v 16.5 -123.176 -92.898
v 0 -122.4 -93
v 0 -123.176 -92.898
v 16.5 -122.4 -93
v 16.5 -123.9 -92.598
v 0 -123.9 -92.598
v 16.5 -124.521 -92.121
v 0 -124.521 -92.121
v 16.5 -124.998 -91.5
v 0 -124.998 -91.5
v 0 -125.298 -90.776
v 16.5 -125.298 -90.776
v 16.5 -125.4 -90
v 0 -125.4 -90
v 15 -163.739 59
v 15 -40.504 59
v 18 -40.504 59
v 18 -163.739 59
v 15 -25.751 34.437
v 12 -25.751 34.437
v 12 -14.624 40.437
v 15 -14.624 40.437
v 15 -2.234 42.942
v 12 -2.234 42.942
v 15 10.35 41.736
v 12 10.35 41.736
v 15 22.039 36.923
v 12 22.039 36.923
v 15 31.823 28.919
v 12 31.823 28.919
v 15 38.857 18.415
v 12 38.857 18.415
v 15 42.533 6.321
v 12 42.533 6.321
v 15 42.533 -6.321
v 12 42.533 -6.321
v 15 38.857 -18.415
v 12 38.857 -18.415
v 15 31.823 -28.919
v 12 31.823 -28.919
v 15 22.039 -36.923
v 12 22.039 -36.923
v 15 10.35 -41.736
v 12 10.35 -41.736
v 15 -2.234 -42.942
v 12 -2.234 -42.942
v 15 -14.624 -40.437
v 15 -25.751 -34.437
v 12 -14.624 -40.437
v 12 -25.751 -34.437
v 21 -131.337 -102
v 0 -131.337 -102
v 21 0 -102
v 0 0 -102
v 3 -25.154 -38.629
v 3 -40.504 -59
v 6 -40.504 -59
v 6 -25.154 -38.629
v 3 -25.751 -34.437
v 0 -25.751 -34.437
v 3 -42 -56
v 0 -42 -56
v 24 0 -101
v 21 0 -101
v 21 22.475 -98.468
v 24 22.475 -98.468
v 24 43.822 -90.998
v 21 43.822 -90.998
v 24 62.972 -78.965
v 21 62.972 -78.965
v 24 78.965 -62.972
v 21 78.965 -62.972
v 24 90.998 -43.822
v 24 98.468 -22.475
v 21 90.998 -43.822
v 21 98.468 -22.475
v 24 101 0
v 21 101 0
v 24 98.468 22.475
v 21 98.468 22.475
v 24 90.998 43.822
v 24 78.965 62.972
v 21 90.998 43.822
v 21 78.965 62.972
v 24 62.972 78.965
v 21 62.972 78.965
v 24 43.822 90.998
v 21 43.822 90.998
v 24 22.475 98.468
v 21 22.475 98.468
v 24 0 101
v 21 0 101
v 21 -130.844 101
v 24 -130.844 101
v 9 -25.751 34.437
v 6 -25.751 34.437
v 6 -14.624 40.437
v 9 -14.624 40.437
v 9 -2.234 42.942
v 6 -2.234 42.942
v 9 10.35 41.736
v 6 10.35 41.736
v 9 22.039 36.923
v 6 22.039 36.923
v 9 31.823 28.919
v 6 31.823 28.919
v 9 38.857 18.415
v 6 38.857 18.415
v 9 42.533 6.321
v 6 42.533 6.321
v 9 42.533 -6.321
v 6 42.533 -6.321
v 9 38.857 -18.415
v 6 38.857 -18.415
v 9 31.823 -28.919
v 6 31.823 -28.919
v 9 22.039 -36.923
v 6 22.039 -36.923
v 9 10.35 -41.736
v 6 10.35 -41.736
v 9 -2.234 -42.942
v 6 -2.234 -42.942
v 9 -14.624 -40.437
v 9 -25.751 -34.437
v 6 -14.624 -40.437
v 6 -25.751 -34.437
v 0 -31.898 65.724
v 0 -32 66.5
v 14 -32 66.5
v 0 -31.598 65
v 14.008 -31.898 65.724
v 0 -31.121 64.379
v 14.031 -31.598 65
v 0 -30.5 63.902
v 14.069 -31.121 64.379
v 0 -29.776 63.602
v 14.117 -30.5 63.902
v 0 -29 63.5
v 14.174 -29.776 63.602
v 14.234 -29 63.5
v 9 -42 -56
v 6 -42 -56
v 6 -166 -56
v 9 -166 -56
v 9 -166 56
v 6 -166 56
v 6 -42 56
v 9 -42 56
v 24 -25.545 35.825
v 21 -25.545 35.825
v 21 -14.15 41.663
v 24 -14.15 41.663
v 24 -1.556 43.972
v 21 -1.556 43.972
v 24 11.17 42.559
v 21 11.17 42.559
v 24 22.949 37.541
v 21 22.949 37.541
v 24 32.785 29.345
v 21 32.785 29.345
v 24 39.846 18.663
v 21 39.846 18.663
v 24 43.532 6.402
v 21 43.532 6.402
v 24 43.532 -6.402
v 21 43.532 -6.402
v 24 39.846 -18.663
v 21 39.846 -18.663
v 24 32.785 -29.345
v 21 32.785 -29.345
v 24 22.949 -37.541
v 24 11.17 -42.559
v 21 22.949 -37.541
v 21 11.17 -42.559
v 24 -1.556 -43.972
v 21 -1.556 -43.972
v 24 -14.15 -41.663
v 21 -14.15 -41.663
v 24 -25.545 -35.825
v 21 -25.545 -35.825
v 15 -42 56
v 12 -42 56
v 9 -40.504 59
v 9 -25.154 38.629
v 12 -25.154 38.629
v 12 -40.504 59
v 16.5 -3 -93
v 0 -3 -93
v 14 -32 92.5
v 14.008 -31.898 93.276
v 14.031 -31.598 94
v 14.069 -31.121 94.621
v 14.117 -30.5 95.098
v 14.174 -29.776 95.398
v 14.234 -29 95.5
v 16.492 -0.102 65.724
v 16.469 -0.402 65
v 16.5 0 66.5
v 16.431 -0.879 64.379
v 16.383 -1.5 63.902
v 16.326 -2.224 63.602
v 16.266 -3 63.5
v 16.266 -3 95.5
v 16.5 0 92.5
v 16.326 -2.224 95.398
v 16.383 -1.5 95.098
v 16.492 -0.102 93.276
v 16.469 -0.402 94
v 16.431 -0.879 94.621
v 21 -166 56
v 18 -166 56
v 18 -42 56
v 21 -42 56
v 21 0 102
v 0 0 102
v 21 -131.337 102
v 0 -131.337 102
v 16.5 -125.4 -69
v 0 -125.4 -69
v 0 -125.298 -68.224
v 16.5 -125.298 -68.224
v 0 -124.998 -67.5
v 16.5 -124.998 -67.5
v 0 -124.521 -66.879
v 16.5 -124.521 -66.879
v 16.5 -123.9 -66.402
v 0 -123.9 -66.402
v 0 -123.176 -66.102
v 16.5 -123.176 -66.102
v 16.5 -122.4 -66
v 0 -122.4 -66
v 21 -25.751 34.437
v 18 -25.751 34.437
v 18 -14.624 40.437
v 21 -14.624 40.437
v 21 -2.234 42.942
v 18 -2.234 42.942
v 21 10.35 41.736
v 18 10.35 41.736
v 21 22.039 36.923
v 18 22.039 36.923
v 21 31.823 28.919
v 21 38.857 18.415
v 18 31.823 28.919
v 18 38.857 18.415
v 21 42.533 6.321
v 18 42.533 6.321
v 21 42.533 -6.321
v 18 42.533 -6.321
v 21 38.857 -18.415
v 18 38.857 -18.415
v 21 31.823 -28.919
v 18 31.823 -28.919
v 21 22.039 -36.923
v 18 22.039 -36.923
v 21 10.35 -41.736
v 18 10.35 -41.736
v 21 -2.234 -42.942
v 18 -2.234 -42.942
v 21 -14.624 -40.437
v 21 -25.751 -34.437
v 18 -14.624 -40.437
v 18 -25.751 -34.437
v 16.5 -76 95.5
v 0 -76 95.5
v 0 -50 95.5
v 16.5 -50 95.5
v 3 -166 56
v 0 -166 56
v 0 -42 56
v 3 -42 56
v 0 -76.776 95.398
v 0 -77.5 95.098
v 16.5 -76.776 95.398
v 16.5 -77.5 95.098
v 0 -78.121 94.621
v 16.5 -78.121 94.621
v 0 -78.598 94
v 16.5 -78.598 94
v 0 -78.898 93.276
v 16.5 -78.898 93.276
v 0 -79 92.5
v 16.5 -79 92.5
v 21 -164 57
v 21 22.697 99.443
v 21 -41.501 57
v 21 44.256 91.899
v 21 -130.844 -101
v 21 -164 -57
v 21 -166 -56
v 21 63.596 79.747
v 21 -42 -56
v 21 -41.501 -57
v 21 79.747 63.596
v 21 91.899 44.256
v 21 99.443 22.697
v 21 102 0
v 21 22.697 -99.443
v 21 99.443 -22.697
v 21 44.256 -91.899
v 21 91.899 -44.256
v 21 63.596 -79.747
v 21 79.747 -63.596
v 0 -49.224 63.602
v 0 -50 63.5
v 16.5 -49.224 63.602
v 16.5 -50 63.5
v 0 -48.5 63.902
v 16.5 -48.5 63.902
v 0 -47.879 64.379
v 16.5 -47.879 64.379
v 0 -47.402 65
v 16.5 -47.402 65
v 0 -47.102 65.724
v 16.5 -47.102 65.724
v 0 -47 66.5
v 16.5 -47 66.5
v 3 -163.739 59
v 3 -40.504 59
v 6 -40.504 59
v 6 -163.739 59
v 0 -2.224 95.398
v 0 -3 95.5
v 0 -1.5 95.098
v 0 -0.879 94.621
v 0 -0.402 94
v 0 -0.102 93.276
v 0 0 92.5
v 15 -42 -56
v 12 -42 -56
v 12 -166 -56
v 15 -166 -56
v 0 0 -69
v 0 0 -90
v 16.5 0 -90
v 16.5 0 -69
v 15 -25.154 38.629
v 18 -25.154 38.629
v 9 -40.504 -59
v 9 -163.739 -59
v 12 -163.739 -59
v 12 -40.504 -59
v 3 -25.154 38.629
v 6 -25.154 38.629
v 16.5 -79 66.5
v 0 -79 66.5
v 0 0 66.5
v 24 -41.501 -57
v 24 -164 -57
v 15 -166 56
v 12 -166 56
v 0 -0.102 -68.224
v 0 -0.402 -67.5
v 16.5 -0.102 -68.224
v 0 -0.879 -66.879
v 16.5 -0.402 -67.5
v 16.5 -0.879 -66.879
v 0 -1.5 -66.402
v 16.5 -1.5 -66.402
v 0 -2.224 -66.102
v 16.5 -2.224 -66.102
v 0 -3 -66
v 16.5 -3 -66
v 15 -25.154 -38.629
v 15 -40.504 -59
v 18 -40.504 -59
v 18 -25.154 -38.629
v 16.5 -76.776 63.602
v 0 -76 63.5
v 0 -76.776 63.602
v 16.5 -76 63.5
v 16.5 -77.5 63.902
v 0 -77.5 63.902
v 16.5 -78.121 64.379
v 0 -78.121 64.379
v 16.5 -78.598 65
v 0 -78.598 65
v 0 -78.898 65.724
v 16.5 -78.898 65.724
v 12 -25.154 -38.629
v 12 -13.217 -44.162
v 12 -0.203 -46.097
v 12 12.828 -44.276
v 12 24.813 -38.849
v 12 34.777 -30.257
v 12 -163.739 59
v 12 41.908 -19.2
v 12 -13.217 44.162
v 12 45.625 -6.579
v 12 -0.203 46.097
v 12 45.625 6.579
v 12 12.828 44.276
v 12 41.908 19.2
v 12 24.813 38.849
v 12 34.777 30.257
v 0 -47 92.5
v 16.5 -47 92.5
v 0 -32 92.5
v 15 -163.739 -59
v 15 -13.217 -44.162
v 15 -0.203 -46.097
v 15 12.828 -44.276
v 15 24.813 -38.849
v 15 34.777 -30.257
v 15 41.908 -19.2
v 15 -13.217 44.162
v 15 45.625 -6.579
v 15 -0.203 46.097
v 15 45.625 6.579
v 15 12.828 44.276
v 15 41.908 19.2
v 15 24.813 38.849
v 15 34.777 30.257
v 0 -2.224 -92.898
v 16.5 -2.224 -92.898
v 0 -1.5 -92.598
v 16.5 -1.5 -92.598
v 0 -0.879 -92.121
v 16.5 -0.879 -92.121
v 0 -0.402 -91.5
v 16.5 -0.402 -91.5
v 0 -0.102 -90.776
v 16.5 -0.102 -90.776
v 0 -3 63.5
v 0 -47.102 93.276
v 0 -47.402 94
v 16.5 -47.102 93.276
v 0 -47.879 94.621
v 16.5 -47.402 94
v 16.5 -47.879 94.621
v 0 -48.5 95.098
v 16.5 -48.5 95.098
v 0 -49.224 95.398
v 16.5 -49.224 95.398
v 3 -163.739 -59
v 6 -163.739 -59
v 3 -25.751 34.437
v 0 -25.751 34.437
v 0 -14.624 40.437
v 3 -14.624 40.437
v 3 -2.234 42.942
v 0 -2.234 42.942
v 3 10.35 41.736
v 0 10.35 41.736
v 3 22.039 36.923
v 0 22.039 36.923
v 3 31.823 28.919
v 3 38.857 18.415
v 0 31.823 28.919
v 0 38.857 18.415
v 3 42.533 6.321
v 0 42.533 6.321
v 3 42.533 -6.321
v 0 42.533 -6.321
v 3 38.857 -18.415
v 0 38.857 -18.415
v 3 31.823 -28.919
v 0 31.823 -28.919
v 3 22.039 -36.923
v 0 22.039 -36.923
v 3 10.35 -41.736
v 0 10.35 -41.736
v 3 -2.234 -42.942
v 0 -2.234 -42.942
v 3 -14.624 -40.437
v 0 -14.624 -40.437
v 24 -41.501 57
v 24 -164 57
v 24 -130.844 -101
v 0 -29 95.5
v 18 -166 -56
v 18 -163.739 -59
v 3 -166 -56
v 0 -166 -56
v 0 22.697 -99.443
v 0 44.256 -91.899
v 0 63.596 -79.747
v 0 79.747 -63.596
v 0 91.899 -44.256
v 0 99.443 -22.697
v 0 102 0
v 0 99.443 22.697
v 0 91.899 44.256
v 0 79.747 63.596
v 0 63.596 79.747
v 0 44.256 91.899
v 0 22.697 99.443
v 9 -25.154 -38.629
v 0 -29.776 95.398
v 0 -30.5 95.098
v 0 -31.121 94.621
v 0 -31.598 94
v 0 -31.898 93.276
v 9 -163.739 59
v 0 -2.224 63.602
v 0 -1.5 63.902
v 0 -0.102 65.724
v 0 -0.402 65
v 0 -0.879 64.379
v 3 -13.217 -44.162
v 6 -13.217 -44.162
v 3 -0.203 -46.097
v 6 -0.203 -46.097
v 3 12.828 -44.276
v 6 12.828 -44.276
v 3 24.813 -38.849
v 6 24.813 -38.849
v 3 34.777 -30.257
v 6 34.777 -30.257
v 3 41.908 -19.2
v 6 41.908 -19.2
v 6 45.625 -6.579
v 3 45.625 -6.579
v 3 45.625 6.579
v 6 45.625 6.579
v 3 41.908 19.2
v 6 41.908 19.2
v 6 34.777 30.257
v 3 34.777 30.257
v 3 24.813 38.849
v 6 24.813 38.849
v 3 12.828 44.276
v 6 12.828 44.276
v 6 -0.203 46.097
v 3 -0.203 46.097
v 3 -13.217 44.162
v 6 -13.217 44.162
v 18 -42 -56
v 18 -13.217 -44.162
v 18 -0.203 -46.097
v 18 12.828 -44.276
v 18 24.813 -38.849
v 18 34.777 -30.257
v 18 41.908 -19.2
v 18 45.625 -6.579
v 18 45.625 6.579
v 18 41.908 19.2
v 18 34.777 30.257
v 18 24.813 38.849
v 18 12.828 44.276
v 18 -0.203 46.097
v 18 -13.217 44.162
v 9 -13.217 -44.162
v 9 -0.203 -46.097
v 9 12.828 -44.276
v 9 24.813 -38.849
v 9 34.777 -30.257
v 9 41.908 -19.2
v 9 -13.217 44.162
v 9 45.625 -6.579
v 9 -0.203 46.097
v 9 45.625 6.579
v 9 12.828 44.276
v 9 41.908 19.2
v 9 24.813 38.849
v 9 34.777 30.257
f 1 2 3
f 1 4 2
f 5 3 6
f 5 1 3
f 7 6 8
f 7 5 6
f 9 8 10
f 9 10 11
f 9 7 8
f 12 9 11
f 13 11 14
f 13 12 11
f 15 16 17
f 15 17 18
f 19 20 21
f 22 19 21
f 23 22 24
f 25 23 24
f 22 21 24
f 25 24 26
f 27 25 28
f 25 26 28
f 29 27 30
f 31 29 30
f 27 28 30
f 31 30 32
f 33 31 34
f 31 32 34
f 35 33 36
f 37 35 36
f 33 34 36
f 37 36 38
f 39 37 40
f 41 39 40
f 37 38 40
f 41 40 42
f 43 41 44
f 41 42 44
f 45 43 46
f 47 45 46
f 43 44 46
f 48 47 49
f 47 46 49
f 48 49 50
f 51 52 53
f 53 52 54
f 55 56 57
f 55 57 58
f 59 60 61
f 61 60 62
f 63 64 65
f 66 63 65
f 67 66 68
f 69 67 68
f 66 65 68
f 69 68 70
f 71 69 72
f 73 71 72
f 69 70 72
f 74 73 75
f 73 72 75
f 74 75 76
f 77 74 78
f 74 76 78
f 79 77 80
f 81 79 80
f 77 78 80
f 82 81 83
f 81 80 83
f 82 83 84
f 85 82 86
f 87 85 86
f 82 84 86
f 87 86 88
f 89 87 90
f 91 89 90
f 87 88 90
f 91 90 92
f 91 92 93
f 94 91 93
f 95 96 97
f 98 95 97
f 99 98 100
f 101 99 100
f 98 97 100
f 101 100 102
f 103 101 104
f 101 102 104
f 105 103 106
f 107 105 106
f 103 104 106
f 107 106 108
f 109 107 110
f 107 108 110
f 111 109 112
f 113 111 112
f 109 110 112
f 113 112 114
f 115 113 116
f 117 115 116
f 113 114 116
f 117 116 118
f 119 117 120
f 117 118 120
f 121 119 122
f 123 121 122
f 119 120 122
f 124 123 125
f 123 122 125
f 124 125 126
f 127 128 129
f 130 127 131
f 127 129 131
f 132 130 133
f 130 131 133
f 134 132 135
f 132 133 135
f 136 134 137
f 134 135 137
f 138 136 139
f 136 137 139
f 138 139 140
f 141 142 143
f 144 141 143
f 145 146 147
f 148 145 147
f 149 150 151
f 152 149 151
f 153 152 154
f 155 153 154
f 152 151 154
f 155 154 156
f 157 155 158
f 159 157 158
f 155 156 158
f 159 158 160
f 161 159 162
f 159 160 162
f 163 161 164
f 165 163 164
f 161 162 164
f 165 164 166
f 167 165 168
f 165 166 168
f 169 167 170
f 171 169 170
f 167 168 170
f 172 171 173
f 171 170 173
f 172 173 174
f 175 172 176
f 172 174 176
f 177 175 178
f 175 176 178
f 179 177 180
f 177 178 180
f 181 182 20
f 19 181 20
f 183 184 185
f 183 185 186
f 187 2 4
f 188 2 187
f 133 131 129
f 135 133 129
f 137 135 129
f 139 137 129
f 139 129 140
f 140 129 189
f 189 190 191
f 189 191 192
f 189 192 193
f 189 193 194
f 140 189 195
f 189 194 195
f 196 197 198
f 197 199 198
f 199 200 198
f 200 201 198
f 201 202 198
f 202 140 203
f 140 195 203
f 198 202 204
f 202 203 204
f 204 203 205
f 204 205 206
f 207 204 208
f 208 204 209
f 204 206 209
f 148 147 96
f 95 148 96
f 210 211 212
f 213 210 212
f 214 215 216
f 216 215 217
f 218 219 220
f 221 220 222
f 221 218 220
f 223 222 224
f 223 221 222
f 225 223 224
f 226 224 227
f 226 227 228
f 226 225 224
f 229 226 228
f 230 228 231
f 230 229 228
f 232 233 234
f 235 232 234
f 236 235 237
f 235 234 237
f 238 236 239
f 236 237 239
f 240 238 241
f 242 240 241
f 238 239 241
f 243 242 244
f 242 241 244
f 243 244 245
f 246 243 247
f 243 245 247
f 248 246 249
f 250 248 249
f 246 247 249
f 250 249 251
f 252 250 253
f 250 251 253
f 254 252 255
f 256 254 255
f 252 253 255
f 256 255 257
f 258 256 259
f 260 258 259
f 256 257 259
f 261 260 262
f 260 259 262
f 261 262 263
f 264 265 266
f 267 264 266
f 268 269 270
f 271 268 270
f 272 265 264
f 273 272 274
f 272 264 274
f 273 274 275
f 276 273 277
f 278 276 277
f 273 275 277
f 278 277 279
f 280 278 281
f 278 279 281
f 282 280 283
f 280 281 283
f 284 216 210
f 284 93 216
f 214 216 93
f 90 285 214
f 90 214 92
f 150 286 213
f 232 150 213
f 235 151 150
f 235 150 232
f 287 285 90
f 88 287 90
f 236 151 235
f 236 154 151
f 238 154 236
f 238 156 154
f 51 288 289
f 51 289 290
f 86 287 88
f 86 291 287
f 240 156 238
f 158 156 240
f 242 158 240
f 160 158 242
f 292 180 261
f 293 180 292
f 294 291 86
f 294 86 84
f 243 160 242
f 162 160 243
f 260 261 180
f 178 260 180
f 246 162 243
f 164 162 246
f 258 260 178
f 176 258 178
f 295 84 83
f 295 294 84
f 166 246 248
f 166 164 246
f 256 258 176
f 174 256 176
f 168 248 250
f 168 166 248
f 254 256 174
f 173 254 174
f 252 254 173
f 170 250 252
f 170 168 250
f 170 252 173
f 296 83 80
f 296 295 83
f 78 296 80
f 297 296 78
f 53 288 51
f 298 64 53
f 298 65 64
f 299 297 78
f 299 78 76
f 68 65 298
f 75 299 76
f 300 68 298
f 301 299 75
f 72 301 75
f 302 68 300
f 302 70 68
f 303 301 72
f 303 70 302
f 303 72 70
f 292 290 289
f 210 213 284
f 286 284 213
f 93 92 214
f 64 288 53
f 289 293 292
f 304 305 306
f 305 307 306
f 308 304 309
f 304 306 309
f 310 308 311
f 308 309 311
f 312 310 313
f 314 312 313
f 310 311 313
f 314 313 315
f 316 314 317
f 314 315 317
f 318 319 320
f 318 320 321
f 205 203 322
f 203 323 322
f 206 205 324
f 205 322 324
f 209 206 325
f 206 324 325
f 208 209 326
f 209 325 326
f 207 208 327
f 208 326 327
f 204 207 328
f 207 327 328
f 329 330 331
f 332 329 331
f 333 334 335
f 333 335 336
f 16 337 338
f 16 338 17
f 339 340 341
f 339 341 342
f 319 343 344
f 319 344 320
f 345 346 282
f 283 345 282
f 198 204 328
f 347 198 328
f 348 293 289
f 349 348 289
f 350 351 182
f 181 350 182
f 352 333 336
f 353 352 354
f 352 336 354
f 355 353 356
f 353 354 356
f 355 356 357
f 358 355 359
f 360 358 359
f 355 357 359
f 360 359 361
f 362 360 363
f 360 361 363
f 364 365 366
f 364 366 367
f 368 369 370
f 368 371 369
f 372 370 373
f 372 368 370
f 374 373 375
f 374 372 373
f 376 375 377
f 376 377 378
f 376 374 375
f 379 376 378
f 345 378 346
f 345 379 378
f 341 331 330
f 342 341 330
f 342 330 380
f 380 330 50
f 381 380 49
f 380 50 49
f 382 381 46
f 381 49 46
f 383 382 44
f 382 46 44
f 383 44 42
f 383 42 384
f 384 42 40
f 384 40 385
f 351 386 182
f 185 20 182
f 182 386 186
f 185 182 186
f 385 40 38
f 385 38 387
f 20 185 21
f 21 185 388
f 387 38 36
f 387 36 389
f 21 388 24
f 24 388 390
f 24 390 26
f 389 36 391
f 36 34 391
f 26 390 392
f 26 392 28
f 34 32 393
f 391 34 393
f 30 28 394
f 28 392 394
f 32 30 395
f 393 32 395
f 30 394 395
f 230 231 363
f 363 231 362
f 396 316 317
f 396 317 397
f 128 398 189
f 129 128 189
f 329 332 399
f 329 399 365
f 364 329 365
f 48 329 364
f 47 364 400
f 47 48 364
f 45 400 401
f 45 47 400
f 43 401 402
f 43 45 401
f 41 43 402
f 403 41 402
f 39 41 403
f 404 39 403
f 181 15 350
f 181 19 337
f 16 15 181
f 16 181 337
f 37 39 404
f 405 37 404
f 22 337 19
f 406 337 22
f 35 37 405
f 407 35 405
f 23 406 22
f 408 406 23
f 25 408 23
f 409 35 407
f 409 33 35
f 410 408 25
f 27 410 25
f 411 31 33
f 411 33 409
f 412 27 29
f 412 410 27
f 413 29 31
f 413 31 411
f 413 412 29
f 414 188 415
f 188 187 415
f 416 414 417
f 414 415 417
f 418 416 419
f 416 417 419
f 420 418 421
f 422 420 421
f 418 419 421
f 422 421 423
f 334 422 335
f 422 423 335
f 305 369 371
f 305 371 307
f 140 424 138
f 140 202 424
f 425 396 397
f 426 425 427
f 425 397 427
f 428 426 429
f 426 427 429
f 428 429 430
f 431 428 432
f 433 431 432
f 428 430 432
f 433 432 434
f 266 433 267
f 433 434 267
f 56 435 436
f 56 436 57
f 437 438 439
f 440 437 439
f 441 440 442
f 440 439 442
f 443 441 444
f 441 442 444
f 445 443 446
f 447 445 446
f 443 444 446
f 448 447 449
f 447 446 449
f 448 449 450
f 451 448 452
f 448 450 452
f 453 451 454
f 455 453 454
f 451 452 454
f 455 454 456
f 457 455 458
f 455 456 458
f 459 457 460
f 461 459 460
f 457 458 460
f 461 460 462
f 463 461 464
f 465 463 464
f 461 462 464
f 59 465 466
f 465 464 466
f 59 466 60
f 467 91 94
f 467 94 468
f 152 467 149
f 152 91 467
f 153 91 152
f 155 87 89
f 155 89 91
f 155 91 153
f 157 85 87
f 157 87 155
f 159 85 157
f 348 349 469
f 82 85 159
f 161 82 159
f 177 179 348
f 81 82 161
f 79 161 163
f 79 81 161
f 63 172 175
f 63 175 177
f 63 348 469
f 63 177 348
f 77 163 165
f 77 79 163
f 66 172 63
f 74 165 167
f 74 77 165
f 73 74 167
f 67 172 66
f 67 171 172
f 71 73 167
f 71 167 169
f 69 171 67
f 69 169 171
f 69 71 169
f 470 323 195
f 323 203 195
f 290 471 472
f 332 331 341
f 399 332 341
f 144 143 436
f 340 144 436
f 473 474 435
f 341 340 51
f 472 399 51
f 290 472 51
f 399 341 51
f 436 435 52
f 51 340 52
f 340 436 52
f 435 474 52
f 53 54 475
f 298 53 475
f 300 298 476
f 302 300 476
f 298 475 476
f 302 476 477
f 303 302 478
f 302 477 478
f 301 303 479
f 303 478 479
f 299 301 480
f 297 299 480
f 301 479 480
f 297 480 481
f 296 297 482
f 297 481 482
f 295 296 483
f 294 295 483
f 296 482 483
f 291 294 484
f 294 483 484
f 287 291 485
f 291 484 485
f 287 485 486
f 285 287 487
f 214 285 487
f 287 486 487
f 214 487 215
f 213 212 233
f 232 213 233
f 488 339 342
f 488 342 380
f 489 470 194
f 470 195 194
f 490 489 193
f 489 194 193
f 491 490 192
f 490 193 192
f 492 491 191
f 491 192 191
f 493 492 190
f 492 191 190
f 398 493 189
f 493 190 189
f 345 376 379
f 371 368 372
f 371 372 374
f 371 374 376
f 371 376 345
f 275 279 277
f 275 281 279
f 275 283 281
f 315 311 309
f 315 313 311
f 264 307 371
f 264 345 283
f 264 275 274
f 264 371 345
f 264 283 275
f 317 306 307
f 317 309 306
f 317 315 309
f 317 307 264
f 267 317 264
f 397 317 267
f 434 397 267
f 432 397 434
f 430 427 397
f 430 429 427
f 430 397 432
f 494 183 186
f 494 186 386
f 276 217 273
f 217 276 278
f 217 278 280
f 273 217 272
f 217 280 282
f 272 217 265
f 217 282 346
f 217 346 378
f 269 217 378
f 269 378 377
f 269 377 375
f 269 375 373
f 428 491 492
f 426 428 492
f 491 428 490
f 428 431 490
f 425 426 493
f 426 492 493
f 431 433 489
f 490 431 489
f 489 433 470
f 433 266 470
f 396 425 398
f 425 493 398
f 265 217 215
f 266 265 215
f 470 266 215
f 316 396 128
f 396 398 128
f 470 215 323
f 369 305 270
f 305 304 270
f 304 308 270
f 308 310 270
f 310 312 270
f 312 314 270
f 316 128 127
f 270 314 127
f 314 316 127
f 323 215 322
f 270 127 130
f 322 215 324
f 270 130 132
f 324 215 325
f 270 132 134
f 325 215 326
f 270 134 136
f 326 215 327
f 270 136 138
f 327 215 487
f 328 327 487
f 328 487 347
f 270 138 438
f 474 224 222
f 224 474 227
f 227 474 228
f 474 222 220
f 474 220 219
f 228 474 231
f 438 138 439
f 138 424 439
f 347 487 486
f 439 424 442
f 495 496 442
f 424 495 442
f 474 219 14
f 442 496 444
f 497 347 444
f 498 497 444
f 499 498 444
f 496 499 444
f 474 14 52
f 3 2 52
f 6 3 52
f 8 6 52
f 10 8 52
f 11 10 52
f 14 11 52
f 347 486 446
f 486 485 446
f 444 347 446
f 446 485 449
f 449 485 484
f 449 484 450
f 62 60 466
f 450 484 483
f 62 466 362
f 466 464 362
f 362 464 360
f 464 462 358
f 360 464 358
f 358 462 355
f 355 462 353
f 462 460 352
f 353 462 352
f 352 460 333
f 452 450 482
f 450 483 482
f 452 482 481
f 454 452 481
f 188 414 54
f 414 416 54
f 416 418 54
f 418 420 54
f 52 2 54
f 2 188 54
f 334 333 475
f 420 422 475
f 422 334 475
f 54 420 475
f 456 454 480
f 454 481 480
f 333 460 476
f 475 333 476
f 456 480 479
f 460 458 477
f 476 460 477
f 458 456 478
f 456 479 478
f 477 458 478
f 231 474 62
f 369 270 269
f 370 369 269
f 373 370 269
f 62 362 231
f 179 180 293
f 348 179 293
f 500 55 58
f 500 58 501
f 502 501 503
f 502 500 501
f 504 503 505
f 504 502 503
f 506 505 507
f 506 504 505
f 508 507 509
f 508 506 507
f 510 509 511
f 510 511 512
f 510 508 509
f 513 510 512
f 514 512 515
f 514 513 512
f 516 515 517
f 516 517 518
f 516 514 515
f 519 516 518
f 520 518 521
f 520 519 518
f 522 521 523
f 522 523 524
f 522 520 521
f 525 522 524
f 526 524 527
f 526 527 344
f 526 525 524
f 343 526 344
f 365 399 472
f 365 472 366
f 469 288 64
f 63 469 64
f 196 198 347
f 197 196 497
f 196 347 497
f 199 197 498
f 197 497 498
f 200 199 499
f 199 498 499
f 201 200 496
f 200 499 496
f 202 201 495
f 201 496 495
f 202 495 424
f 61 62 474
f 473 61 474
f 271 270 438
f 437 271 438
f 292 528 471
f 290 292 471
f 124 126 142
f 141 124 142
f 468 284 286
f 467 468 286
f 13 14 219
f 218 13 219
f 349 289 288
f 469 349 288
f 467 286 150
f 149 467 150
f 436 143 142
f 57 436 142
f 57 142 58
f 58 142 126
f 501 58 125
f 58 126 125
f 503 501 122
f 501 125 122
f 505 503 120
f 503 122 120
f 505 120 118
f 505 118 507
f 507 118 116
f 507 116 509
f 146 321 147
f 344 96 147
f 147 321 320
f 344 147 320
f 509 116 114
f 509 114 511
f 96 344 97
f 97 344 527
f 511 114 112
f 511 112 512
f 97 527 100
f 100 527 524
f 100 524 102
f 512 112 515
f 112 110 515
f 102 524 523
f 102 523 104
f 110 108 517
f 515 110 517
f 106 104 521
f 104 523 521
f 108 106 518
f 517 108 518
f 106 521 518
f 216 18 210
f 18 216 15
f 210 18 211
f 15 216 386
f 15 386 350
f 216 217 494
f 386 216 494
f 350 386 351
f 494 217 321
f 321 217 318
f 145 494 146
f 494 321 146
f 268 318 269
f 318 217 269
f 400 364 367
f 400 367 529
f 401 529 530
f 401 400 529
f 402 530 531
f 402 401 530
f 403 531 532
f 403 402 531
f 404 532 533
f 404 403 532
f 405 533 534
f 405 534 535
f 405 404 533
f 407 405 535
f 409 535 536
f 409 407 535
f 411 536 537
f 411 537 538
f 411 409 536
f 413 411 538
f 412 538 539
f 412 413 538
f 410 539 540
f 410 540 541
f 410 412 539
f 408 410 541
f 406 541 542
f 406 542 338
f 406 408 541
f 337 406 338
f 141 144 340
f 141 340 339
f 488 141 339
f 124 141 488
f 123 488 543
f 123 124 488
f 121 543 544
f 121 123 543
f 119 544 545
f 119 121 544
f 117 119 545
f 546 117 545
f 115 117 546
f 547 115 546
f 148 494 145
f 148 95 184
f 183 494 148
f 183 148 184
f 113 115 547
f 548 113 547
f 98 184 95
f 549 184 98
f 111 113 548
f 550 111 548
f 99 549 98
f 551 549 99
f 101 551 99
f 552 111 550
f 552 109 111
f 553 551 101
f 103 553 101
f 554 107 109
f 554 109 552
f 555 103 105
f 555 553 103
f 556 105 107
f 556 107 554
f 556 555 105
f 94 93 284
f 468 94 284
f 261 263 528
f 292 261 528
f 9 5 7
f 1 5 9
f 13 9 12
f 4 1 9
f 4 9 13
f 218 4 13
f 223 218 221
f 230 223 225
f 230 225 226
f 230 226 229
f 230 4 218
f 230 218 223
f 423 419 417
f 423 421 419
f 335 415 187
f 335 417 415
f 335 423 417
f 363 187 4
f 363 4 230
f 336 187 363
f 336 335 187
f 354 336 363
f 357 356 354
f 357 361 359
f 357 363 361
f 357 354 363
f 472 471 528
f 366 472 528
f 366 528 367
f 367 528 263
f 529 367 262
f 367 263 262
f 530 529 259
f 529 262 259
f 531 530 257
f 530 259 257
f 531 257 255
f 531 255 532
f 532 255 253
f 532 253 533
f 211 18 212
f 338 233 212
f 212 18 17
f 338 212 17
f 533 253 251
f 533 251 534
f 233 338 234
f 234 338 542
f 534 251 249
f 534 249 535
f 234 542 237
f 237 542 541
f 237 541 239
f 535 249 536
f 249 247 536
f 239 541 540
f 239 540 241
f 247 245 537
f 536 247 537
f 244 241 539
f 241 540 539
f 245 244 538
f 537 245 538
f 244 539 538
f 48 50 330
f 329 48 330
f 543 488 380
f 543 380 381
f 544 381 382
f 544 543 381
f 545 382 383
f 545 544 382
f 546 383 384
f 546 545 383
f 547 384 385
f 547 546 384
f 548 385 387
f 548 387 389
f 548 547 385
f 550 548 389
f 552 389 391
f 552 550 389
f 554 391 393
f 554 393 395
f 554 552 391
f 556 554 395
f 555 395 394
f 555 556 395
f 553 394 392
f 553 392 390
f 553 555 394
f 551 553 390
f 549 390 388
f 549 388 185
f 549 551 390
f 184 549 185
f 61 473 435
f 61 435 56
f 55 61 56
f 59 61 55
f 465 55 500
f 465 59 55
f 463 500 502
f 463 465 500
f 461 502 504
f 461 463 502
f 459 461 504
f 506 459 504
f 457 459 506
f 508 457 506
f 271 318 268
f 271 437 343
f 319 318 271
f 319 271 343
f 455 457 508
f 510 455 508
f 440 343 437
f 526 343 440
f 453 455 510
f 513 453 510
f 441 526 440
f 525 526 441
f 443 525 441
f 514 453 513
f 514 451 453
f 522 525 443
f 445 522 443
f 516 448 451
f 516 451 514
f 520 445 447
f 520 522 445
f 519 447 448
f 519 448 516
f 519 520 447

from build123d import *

# Parameters (mm, degrees)
EXTRUDE_1_DEPTH     = 21
EXTRUDE_2_DEPTH     = 3
SKETCH_4_W          = 27
SKETCH_4_H          = 125.4
CUT_EXTRUDE_1_DEPTH = 16.5
CUT_EXTRUDE_3_DEPTH = 32
SKETCH_6_W          = 32
SKETCH_6_H          = 32
CUT_EXTRUDE_4_DEPTH = 16.5
FILLET_1_R          = 3
SWEEP_START         = 3
SWEEP_3_DEPTH       = 3
SWEEP_START_2       = 9
SWEEP_3_2_DEPTH     = 3
SWEEP_START_3       = 15
SWEEP_3_3_DEPTH     = 3


# Read off the part's stored shape, not the designer's step: Вырез-По траектории3
with BuildPart() as part:
    # Эскиз1 → Бобышка-Вытянуть1 (new body)
    with BuildSketch(Plane(origin=(0, 0, 0), x_dir=(0, 0, -1), z_dir=(1, 0, 0))):
        with BuildLine():
            Line((-56, -42), (-34.436750731, -25.75092618))
            ThreePointArc((-34.436750731, -25.75092618), (0, 43), (34.436750731, -25.75092618))
            Line((34.436750731, -25.75092618), (56, -42))
            Line((56, -42), (56, -166))
            Line((56, -166), (102, -131.336513695))
            Line((102, -131.336513695), (102, 0))
            ThreePointArc((102, 0), (0, 102), (-102, 0))
            Line((-102, 0), (-102, -131.336513695))
            Line((-102, -131.336513695), (-56, -166))
            Line((-56, -166), (-56, -42))
        make_face()
    extrude(amount=EXTRUDE_1_DEPTH)

    # Эскиз3 → Бобышка-Вытянуть2 (add)
    with BuildSketch(Plane(origin=(21, 0, 0), x_dir=(0, 0, -1), z_dir=(1, 0, 0))):
        with BuildLine():
            Line((-57, -41.501418392), (-35.82524401, -25.545095256))
            ThreePointArc((-35.82524401, -25.545095256), (0, 44), (35.82524401, -25.545095256))
            Line((35.82524401, -25.545095256), (57, -41.501418392))
            Line((57, -41.501418392), (57, -164))
            Line((57, -164), (101, -130.843621795))
            Line((101, -130.843621795), (101, 0))
            ThreePointArc((101, 0), (0, 101), (-101, 0))
            Line((-101, 0), (-101, -130.843621795))
            Line((-101, -130.843621795), (-57, -164))
            Line((-57, -164), (-57, -41.501418392))
        make_face()
    extrude(amount=EXTRUDE_2_DEPTH)

    # Эскиз4 → Вырез-Вытянуть1 (cut)
    with BuildSketch(Plane.ZY):
        with Locations((-79.5, -62.7)):
            Rectangle(SKETCH_4_W, SKETCH_4_H)
    extrude(amount=-CUT_EXTRUDE_1_DEPTH, mode=Mode.SUBTRACT)

    # Sketch 1 2 → Вырез-Вытянуть3 (cut)
    with BuildSketch(Plane(origin=(0, 0, 95.5), x_dir=(0.400818834019707, -0.9161573349021895, 0), z_dir=(0, 0, 1))):
        Polygon((0, 0), (29.317034717, -12.826202689), (34.928498393, 0), (6.613510761, 15.116596026), align=None)
    extrude(amount=-CUT_EXTRUDE_3_DEPTH, mode=Mode.SUBTRACT)

    # Эскиз6 → Вырез-Вытянуть4 (cut)
    with BuildSketch(Plane.ZY):
        with Locations((79.5, -63)):
            Rectangle(SKETCH_6_W, SKETCH_6_H)
    extrude(amount=-CUT_EXTRUDE_4_DEPTH, mode=Mode.SUBTRACT)

    # Скругление1
    fillet_1_edges = [part.edges().sort_by_distance(p)[0] for p in [
        (8.25, -125.4, -66),
        (8.25, -125.4, -93),
        (8.25, 0, -66),
        (8.25, 0, -93),
        (8.25, -79, 95.5),
        (8.25, -79, 63.5),
        (8.25, -47, 95.5),
        (8.25, -47, 63.5),
        (7, -32, 63.5),
        (7, -32, 95.5),
        (8.25, 0, 63.5),
        (8.25, 0, 95.5),
    ]]
    fillet(fillet_1_edges, radius=FILLET_1_R)

    # Вырез-По траектории3 outline → Вырез-По траектории3 (cut)
    with BuildSketch(Plane.YZ.offset(SWEEP_START)):
        with BuildLine():
            Line((-25.153803165, 38.62926215), (-40.504255176, 59))
            Line((-40.504255176, 59), (-163.73933785, 59))
            Line((-163.73933785, 59), (-166, 56))
            Line((-166, 56), (-42, 56))
            Line((-42, 56), (-25.75092618, 34.436750731))
            ThreePointArc((-25.75092618, 34.436750731), (43, 0), (-25.75092618, -34.436750731))
            Line((-25.75092618, -34.436750731), (-42, -56))
            Line((-42, -56), (-166, -56))
            Line((-166, -56), (-163.73933785, -59))
            Line((-163.73933785, -59), (-40.504255176, -59))
            Line((-40.504255176, -59), (-25.153803165, -38.62926215))
            ThreePointArc((-25.153803165, -38.62926215), (46.097003242, 0), (-25.153803165, 38.62926215))
        make_face()
    extrude(amount=SWEEP_3_DEPTH, mode=Mode.SUBTRACT)

    # Sweep 3 2 outline → Sweep 3 2 (cut)
    with BuildSketch(Plane.YZ.offset(SWEEP_START_2)):
        with BuildLine():
            Line((-25.153803165, 38.62926215), (-40.504255176, 59))
            Line((-40.504255176, 59), (-163.73933785, 59))
            Line((-163.73933785, 59), (-166, 56))
            Line((-166, 56), (-42, 56))
            Line((-42, 56), (-25.75092618, 34.436750731))
            ThreePointArc((-25.75092618, 34.436750731), (43, 0), (-25.75092618, -34.436750731))
            Line((-25.75092618, -34.436750731), (-42, -56))
            Line((-42, -56), (-166, -56))
            Line((-166, -56), (-163.73933785, -59))
            Line((-163.73933785, -59), (-40.504255176, -59))
            Line((-40.504255176, -59), (-25.153803165, -38.62926215))
            ThreePointArc((-25.153803165, -38.62926215), (46.097003242, 0), (-25.153803165, 38.62926215))
        make_face()
    extrude(amount=SWEEP_3_2_DEPTH, mode=Mode.SUBTRACT)

    # Sweep 3 3 outline → Sweep 3 3 (cut)
    with BuildSketch(Plane.YZ.offset(SWEEP_START_3)):
        with BuildLine():
            Line((-25.153803165, 38.62926215), (-40.504255176, 59))
            Line((-40.504255176, 59), (-163.73933785, 59))
            Line((-163.73933785, 59), (-166, 56))
            Line((-166, 56), (-42, 56))
            Line((-42, 56), (-25.75092618, 34.436750731))
            ThreePointArc((-25.75092618, 34.436750731), (43, 0), (-25.75092618, -34.436750731))
            Line((-25.75092618, -34.436750731), (-42, -56))
            Line((-42, -56), (-166, -56))
            Line((-166, -56), (-163.73933785, -59))
            Line((-163.73933785, -59), (-40.504255176, -59))
            Line((-40.504255176, -59), (-25.153803165, -38.62926215))
            ThreePointArc((-25.153803165, -38.62926215), (46.097003242, 0), (-25.153803165, 38.62926215))
        make_face()
    extrude(amount=SWEEP_3_3_DEPTH, mode=Mode.SUBTRACT)


solid = part.part
